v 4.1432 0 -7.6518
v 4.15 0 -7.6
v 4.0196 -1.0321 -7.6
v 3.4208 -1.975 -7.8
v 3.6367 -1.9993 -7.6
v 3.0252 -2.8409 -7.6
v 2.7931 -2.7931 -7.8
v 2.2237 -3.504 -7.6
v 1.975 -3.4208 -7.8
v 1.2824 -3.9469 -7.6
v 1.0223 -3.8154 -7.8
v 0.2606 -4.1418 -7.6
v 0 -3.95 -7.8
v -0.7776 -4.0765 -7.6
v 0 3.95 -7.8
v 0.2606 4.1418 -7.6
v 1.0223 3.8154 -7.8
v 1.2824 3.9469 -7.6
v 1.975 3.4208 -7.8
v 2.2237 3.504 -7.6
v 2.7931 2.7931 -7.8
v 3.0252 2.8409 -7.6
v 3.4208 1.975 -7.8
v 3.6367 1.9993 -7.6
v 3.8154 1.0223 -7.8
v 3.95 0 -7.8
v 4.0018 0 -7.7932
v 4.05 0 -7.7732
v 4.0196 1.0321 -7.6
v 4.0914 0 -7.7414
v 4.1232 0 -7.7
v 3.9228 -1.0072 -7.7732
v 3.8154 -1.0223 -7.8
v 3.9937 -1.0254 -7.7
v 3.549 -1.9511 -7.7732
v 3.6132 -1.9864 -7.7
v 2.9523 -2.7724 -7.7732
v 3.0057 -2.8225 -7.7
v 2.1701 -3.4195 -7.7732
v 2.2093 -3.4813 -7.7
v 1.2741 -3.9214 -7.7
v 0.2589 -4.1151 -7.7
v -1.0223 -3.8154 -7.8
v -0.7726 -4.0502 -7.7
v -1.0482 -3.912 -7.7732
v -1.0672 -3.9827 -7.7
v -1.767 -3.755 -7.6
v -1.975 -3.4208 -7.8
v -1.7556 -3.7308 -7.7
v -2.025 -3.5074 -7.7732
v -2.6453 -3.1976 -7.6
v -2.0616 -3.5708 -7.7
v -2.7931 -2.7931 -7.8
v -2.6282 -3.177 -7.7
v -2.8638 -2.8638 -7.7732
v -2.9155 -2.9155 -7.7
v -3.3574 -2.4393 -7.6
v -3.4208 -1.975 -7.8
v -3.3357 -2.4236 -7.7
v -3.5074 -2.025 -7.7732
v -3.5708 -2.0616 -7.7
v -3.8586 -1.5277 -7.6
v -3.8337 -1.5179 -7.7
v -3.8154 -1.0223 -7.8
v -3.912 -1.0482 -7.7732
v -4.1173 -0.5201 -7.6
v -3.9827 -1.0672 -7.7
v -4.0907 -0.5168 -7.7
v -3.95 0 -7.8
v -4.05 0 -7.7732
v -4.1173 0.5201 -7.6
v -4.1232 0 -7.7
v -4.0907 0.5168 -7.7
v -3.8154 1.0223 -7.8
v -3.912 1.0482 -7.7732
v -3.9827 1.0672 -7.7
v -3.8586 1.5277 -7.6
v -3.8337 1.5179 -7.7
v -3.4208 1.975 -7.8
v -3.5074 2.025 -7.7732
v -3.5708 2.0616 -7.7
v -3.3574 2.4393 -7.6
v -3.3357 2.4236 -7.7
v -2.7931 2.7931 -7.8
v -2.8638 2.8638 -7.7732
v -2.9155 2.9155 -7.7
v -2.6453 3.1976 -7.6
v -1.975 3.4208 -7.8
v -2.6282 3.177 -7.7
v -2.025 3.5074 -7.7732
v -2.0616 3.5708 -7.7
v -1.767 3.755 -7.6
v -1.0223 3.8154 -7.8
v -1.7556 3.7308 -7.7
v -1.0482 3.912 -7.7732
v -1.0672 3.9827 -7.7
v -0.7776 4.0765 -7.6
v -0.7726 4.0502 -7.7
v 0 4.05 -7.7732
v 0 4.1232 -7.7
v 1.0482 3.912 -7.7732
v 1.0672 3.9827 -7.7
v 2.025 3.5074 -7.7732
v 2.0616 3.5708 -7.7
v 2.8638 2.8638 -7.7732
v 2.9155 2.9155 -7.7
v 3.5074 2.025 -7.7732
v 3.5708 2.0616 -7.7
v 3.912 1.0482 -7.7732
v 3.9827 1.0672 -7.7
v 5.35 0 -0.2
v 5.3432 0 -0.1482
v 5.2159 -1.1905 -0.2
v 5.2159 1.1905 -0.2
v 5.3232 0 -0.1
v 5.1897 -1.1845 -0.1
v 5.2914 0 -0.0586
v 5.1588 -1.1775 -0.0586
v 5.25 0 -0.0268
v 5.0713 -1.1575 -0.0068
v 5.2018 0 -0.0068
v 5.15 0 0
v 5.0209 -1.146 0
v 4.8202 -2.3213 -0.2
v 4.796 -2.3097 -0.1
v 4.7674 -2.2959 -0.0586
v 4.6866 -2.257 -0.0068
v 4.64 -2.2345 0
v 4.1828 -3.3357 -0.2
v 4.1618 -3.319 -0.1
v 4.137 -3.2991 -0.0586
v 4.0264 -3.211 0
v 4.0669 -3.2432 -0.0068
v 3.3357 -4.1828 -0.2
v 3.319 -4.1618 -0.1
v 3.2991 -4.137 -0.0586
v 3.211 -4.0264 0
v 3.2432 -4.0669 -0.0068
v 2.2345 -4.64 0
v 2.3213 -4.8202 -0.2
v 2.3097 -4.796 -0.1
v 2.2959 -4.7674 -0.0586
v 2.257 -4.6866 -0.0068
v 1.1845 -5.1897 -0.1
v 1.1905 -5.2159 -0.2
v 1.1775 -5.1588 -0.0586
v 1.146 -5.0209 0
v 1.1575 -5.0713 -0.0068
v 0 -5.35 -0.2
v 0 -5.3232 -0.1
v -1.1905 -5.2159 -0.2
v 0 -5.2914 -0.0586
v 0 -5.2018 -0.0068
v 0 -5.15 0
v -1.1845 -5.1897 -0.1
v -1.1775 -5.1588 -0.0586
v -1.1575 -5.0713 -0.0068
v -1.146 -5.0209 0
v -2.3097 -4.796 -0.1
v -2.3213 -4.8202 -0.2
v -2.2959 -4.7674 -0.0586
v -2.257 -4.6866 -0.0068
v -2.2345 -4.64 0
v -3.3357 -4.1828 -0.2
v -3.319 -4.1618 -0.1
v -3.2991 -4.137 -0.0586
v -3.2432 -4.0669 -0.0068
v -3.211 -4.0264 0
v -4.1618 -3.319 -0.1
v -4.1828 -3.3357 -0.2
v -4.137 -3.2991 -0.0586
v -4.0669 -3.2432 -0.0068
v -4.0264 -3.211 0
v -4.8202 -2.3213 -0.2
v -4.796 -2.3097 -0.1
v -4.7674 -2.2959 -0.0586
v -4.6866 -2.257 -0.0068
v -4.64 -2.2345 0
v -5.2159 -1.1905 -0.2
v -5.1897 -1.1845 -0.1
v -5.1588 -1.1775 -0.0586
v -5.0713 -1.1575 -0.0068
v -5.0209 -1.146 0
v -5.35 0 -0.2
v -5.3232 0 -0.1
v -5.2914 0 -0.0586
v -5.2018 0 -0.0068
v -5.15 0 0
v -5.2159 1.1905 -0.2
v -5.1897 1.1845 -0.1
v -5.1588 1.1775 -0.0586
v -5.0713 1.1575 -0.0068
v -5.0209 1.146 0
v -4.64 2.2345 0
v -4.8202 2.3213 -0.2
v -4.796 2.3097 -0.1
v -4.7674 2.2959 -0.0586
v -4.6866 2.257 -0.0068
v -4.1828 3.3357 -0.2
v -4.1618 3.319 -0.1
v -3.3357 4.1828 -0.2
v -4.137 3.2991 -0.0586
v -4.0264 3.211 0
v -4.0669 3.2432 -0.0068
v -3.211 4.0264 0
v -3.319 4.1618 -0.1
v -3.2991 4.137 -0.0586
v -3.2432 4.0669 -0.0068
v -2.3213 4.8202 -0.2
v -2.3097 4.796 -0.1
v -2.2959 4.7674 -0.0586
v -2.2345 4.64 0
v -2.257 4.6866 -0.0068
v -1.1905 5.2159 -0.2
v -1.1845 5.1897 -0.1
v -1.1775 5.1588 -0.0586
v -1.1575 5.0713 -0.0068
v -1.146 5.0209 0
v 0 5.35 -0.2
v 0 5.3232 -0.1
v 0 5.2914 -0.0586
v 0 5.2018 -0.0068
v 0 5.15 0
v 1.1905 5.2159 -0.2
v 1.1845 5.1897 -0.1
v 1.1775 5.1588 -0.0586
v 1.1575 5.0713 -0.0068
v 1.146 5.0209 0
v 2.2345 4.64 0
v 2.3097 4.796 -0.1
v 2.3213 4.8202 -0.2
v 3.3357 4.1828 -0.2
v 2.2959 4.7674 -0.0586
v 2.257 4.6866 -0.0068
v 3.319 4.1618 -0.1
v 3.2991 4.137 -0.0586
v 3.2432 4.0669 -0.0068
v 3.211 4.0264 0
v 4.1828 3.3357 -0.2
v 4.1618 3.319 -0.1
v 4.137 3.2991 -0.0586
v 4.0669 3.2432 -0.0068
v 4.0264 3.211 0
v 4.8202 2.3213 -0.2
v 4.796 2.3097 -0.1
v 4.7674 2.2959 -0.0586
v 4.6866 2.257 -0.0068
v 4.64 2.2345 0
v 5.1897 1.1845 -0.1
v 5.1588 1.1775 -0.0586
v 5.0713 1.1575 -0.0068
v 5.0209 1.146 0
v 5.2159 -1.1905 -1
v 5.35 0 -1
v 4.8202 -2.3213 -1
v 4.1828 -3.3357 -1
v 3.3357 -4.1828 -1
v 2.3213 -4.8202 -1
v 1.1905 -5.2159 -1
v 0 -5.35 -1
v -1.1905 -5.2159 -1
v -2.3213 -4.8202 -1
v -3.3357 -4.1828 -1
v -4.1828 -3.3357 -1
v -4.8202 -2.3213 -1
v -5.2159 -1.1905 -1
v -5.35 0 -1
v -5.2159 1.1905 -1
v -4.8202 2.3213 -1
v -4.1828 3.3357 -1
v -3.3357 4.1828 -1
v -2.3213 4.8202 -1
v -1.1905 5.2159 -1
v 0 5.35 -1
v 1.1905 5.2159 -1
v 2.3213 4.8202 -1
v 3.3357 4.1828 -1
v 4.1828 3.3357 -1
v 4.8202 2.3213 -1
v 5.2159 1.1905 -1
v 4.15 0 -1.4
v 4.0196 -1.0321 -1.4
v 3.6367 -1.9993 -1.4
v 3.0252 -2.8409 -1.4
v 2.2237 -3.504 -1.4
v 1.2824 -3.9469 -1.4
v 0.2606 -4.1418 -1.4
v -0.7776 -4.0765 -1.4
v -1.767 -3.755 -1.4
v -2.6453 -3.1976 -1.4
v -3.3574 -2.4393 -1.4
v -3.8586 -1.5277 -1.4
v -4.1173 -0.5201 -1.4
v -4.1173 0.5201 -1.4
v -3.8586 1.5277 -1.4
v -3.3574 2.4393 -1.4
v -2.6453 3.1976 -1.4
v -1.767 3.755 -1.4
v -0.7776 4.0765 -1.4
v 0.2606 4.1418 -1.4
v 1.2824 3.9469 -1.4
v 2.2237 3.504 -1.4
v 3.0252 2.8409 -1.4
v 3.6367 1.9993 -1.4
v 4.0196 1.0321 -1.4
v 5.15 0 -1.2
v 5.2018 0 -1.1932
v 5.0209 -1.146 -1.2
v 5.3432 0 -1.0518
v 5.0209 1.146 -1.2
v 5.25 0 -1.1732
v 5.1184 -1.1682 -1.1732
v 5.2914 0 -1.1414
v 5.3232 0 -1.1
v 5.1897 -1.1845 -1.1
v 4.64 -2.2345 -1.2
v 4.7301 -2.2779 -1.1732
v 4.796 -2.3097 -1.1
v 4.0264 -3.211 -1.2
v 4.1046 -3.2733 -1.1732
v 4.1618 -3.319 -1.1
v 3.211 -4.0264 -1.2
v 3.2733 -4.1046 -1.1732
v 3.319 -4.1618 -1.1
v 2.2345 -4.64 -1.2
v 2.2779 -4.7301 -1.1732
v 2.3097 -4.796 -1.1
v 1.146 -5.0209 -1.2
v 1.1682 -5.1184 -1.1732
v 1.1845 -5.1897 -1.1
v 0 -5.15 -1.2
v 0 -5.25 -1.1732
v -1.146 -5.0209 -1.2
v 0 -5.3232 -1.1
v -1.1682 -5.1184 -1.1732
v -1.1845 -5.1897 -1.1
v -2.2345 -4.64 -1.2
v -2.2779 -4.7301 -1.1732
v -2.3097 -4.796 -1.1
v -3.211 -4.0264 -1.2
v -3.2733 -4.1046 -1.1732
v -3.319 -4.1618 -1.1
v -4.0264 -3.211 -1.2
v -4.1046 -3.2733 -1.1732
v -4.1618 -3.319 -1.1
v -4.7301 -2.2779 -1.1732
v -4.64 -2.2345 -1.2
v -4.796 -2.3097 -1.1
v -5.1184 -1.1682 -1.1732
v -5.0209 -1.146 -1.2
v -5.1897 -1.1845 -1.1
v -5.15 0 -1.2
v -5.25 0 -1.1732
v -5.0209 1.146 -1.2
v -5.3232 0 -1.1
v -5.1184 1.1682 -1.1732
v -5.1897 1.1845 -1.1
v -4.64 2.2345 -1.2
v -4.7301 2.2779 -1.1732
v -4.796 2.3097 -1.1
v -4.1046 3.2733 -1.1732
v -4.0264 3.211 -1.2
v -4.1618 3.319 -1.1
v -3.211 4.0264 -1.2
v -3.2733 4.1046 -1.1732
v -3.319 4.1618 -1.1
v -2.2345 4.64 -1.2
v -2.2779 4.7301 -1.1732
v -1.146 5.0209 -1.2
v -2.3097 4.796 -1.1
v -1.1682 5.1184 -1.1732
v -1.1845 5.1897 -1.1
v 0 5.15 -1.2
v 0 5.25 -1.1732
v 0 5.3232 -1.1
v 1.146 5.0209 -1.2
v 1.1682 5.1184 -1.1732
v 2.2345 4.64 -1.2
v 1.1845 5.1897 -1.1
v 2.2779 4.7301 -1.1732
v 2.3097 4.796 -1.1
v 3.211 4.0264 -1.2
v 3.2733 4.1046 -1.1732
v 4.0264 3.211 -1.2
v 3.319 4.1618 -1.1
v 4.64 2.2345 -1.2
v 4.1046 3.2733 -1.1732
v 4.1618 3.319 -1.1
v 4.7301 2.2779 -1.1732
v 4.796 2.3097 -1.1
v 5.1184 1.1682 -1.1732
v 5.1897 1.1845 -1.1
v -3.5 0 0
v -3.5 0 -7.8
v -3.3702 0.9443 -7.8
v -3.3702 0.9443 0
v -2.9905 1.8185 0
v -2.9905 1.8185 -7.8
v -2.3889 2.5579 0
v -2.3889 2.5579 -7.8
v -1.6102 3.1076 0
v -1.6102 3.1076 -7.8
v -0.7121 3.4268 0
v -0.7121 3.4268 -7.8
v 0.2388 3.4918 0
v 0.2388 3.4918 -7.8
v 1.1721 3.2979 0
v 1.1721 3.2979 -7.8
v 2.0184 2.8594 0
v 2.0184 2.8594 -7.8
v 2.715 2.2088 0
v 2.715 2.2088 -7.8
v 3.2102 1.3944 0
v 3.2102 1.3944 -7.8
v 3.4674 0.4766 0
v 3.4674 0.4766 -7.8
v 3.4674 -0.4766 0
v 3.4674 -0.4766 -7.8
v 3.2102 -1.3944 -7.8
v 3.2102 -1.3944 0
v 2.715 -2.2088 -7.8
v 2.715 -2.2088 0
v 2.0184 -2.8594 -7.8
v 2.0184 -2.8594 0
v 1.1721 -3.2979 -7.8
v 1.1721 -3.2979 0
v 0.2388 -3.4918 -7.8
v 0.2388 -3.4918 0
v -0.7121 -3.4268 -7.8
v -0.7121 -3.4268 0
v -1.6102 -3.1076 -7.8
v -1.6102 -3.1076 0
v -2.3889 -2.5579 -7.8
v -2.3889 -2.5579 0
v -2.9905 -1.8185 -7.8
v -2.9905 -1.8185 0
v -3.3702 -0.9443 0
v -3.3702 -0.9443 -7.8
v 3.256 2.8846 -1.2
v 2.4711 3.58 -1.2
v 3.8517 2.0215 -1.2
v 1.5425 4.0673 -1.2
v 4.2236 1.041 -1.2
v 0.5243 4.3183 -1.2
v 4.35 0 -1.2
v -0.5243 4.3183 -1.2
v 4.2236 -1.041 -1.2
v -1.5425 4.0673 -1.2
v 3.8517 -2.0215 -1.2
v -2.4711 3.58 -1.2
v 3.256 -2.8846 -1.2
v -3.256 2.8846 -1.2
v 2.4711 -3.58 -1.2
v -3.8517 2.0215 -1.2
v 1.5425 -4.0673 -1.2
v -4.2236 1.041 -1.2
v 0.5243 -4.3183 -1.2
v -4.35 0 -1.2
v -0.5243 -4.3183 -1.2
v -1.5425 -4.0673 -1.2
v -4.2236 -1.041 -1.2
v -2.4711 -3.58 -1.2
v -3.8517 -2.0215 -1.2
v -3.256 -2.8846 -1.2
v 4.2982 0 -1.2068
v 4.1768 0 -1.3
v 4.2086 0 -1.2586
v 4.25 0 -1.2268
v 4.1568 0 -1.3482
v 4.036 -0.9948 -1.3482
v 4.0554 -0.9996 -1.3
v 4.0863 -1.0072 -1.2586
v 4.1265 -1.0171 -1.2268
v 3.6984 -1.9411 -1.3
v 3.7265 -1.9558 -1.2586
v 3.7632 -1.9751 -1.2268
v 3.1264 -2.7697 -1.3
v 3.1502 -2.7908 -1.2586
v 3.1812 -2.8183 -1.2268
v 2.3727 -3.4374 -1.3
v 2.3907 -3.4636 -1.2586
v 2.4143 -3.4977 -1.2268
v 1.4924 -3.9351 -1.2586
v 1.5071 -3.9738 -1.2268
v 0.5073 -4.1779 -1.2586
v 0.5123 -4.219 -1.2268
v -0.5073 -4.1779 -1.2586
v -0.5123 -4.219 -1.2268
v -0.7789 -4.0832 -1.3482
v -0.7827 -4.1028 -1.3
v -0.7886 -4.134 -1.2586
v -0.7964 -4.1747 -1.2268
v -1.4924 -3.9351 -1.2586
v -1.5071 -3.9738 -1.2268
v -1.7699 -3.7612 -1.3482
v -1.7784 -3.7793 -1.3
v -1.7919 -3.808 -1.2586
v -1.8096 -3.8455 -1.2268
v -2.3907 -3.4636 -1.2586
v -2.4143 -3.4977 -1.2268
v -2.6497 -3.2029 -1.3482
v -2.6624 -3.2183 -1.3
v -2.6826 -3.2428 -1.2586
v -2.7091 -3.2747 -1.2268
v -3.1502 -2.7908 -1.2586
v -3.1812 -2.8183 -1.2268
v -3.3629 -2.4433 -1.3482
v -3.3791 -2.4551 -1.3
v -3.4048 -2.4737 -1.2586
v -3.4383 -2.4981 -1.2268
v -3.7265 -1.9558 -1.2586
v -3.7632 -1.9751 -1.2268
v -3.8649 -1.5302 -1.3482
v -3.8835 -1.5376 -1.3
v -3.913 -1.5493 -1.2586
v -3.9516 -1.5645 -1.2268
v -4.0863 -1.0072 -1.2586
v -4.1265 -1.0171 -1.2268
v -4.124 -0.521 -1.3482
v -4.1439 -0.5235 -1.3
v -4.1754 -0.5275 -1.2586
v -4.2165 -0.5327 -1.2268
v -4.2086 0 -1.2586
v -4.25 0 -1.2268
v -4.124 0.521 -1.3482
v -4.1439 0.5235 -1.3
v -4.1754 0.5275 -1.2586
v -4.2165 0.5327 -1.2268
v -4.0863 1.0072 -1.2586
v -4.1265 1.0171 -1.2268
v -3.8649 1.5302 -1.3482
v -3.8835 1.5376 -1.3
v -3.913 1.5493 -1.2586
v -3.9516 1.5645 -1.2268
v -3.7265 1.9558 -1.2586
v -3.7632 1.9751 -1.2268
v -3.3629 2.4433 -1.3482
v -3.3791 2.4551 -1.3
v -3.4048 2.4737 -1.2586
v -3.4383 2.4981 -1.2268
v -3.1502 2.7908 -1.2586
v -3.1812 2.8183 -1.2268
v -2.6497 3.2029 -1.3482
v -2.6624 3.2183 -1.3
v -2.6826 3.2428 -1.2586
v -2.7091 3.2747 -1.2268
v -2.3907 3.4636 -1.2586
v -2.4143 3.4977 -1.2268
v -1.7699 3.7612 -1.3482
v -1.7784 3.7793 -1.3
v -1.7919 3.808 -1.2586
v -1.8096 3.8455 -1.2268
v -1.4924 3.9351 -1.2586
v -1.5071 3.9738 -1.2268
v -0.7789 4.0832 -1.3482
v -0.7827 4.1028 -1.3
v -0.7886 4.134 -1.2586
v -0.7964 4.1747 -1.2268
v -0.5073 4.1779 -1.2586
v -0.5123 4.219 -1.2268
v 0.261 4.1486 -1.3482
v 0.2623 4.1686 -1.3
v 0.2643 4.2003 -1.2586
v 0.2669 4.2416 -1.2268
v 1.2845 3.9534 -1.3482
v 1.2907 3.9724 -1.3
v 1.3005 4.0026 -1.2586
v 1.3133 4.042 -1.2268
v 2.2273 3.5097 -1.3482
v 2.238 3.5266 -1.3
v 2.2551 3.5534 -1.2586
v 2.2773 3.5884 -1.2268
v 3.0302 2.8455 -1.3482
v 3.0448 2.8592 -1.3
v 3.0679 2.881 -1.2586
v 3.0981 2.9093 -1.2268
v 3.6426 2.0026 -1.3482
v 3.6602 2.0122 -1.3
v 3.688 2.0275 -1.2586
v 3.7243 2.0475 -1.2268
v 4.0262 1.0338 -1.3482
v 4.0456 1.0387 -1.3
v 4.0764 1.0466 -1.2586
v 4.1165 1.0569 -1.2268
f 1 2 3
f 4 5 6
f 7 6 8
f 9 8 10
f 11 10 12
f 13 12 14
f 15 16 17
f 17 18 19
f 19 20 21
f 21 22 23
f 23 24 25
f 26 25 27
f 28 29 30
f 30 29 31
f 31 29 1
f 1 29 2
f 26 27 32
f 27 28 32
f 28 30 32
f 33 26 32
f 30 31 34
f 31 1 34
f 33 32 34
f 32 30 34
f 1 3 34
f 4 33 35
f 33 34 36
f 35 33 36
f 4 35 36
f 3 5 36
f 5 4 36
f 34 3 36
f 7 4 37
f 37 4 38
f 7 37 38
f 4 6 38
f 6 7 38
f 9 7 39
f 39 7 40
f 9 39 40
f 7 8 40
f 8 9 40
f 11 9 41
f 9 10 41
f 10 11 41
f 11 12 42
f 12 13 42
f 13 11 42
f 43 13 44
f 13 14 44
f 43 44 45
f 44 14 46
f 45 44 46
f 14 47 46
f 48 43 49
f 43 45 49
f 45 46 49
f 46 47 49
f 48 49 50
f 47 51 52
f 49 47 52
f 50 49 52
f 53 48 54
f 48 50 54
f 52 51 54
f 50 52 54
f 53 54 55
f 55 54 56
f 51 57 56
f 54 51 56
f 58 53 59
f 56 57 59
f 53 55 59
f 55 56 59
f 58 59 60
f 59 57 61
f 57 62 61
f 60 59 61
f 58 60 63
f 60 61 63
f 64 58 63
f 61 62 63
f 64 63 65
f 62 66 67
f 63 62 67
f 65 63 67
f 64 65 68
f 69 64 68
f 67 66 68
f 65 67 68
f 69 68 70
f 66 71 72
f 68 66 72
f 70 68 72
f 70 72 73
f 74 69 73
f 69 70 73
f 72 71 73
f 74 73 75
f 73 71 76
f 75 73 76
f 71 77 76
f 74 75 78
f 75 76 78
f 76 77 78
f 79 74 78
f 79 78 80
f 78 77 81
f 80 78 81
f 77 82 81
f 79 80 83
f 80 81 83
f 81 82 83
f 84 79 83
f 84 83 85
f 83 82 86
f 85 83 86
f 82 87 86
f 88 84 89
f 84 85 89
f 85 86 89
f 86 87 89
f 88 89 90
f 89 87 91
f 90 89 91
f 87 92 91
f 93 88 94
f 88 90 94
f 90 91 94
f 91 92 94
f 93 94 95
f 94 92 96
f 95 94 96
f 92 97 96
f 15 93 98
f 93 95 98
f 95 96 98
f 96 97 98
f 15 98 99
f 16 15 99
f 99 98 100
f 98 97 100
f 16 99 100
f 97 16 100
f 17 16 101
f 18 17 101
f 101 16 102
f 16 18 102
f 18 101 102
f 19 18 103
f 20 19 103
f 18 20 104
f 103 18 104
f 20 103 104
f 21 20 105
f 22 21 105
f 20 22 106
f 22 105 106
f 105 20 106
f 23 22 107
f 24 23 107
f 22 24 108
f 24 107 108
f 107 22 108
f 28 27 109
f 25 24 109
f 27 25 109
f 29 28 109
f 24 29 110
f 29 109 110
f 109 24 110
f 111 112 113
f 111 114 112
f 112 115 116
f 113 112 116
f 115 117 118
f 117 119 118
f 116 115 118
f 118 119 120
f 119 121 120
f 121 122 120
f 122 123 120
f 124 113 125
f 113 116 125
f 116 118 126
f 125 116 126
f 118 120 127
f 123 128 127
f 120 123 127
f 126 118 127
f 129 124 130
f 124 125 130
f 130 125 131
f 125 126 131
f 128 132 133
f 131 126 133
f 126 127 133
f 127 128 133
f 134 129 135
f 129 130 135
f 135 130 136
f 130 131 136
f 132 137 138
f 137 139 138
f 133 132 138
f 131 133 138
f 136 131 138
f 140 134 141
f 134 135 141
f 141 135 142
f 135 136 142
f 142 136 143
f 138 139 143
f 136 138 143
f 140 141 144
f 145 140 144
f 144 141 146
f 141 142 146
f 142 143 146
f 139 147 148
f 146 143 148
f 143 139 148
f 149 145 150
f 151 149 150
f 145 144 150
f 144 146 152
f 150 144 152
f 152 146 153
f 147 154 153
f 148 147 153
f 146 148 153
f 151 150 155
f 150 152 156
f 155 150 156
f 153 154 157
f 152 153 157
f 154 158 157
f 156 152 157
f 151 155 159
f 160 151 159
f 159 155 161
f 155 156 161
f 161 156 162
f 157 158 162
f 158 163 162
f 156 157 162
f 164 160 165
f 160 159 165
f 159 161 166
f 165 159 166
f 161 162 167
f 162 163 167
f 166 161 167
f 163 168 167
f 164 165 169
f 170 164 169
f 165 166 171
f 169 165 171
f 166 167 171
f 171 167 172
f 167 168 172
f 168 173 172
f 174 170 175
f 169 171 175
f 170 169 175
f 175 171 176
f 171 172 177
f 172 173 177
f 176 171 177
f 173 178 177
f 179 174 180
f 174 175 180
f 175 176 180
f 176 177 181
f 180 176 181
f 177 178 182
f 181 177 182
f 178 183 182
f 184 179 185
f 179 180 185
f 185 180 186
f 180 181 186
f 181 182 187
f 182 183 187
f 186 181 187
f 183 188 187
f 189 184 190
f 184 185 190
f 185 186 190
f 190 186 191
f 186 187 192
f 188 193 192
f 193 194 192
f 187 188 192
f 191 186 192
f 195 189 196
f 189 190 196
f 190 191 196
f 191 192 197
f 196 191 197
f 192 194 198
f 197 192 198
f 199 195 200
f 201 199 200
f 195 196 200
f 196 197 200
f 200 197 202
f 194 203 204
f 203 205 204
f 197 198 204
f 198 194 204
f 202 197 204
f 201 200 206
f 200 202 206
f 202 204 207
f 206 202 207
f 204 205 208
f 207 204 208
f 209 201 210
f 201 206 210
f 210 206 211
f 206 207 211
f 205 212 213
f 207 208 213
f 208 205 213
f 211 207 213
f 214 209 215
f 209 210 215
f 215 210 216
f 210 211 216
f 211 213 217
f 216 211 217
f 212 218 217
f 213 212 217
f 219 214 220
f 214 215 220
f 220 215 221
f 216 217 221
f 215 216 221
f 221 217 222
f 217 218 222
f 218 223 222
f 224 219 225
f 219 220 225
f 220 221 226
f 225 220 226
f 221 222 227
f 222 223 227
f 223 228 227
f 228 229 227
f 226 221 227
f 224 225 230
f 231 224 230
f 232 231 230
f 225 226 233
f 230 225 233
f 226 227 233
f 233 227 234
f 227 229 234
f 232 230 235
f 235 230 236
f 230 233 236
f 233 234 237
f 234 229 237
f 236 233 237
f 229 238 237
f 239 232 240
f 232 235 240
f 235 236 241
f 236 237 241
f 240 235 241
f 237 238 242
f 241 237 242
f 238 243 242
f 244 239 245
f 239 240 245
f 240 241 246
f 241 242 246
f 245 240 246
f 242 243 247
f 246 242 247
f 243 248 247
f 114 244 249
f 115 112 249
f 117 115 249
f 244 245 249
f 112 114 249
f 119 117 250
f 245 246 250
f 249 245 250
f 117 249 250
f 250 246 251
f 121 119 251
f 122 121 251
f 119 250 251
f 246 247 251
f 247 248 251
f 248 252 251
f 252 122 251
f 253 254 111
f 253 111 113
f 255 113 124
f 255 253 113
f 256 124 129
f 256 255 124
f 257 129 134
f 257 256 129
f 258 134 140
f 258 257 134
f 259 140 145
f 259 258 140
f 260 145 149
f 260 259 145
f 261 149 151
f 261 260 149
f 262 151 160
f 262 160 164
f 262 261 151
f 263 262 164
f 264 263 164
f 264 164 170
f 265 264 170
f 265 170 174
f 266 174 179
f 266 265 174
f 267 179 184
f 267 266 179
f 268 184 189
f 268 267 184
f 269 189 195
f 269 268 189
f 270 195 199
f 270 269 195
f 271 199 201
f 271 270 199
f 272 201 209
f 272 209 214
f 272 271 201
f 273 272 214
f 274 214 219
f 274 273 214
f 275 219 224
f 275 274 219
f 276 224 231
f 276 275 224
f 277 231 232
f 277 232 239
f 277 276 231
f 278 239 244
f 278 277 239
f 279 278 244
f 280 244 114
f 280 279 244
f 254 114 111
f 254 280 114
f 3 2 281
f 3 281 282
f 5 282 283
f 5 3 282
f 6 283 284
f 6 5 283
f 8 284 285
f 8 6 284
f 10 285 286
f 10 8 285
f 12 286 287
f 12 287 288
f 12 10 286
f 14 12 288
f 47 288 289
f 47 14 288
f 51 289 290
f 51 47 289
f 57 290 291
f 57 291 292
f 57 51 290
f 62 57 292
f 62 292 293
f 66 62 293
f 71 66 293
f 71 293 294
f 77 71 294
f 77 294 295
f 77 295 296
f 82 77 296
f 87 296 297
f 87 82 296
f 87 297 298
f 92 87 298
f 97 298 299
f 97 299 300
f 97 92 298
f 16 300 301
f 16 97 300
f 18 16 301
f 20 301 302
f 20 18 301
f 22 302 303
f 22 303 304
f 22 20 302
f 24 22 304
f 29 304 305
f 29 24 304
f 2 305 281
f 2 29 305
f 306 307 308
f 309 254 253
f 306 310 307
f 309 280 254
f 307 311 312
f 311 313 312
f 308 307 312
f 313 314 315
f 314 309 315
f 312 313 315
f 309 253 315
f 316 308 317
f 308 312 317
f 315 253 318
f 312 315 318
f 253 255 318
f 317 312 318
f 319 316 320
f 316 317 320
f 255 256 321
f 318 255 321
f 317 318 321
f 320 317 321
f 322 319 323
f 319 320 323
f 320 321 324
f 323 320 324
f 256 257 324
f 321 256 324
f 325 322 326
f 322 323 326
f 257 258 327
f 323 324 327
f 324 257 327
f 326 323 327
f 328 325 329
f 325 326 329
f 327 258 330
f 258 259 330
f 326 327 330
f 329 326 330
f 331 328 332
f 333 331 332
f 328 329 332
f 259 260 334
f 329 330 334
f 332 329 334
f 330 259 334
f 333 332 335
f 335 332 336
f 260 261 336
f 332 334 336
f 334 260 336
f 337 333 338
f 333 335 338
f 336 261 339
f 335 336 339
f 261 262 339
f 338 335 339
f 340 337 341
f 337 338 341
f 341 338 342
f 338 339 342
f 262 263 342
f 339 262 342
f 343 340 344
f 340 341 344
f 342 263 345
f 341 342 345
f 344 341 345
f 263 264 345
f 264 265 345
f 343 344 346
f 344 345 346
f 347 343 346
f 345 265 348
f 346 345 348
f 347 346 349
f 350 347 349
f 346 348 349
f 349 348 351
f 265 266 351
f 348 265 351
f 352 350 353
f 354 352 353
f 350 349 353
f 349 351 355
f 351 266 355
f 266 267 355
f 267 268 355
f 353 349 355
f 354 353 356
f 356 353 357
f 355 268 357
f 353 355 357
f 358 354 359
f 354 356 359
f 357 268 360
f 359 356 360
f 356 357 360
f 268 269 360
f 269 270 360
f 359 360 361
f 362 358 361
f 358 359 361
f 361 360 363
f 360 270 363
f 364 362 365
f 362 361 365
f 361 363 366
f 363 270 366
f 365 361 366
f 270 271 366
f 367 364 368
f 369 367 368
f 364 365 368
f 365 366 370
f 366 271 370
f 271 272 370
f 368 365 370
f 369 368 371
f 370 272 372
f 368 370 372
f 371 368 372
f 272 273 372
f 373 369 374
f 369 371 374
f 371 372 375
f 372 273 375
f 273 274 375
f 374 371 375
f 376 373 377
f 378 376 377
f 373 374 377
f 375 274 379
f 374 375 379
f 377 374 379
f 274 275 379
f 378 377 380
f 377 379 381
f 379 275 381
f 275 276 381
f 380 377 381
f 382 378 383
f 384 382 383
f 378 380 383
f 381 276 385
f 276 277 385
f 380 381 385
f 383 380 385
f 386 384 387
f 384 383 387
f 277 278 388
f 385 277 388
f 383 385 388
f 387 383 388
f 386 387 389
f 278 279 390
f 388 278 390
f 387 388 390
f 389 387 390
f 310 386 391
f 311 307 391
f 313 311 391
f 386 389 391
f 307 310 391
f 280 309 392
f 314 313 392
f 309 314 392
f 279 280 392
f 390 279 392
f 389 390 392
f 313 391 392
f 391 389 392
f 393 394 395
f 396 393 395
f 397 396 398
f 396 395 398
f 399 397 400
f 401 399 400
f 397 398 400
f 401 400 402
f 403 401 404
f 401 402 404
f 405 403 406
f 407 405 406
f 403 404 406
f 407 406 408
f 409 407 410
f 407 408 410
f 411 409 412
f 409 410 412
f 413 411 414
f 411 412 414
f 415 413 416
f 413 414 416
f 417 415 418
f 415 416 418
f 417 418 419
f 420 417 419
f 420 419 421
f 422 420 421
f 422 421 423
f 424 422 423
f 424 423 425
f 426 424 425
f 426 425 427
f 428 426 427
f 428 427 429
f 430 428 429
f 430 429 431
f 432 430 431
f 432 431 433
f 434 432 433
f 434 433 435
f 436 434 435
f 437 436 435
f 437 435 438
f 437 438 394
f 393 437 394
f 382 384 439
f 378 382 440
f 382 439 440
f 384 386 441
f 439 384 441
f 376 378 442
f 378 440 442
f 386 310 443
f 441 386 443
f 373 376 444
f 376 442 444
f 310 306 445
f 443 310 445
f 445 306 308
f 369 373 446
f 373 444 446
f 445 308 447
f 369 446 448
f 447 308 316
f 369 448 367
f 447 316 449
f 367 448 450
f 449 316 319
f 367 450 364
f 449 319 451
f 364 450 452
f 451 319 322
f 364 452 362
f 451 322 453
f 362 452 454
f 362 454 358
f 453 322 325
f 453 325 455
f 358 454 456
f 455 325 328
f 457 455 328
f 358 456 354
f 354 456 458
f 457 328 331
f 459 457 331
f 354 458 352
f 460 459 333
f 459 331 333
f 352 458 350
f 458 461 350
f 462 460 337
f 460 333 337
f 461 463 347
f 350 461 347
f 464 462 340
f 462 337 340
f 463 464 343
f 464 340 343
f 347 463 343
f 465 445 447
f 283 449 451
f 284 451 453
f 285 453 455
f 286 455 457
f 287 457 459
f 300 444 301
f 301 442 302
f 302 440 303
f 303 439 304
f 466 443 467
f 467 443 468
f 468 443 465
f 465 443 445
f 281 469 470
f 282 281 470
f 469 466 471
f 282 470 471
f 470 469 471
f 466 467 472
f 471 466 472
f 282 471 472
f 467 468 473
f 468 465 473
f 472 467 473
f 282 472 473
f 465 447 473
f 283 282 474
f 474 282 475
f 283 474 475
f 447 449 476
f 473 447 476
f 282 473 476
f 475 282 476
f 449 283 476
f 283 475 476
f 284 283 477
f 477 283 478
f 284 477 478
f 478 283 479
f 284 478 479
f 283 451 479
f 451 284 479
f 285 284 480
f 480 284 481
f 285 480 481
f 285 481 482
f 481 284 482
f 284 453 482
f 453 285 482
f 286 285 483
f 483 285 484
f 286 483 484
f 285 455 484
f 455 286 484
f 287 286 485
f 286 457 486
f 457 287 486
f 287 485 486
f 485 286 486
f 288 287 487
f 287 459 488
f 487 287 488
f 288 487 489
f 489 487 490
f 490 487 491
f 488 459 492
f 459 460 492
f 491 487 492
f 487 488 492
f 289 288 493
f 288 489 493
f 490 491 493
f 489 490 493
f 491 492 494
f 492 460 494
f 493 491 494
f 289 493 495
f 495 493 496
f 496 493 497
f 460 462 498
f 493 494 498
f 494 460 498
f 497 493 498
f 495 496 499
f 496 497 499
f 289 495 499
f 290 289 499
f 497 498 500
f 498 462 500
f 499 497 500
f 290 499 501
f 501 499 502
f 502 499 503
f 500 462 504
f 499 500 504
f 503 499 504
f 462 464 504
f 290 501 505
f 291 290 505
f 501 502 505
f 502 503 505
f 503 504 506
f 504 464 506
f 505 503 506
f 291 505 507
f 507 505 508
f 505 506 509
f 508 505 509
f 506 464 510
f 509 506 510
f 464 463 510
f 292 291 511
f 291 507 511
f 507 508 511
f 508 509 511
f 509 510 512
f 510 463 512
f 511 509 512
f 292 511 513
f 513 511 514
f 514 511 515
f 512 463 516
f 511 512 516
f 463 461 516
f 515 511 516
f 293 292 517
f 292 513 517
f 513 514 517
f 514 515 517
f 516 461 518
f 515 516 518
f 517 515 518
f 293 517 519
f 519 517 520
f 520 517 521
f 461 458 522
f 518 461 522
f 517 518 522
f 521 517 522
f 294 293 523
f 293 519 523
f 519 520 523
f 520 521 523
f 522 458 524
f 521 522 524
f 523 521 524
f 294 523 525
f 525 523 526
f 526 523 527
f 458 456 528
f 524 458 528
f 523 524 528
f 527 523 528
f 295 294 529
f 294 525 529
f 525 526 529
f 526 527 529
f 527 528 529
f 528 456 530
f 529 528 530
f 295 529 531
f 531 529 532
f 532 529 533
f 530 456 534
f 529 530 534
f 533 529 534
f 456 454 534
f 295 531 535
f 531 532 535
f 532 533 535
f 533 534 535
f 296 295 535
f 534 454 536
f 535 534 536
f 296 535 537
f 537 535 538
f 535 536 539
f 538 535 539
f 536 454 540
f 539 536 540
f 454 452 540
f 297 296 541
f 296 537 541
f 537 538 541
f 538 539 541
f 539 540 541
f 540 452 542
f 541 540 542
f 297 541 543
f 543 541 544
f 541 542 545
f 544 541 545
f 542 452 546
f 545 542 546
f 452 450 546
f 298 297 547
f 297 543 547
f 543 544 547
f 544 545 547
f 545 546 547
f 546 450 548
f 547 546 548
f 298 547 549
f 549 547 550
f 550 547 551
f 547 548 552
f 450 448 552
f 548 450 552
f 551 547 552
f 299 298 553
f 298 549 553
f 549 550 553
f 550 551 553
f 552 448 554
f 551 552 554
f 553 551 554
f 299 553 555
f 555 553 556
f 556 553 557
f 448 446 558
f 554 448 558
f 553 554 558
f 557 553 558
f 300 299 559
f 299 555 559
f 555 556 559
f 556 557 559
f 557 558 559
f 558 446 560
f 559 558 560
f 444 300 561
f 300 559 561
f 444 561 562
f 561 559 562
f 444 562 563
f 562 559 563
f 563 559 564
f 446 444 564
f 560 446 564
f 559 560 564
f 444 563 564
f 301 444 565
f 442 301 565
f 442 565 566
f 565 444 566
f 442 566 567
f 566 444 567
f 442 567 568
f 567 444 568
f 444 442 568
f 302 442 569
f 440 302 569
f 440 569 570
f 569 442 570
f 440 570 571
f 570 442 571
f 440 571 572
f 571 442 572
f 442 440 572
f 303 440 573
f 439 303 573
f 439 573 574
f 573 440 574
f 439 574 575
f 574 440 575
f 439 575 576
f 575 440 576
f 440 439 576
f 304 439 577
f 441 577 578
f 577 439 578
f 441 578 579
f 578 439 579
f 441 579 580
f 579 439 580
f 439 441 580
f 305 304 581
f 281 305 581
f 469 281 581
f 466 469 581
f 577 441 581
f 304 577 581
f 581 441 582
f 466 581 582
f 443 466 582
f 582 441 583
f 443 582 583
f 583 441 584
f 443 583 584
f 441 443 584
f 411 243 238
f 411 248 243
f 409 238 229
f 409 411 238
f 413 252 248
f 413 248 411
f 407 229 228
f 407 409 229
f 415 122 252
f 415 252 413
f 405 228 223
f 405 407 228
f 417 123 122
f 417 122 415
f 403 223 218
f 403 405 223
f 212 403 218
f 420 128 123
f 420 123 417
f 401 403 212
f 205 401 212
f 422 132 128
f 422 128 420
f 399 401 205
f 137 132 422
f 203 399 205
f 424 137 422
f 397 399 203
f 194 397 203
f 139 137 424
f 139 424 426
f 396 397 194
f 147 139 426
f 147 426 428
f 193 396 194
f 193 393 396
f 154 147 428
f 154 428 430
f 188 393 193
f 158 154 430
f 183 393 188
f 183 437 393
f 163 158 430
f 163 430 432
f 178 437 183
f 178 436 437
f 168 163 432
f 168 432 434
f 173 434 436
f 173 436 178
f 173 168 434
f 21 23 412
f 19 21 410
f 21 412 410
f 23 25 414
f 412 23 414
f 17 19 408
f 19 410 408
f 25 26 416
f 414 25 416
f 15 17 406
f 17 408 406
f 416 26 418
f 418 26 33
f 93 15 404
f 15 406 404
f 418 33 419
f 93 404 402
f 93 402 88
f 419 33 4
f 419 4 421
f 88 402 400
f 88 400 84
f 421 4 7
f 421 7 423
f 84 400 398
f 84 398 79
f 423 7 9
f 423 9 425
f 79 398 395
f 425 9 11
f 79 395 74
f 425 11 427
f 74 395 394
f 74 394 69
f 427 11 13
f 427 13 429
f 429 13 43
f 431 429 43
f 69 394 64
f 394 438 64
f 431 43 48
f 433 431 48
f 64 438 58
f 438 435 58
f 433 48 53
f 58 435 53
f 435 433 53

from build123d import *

# Parameters (mm, degrees)
CROQUIS1_W            = 5.35
CROQUIS1_H            = 7.8
CROQUIS4_R            = 3.5
CORTAR_EXTRUIR1_DEPTH = 8
CROQUIS3_W            = 1.2
CROQUIS3_H            = 6.6
REDONDEO1_R           = 0.2
REDONDEO2_R           = 0.2
REDONDEO3_R           = 0.2


with BuildPart() as part:
    # Croquis1 → Revolución1 (revolve)
    with BuildSketch(Plane(origin=(0, 0, 0), x_dir=(1, 0, 0), z_dir=(0, 1, 0))):
        with Locations((2.675, 3.9)):
            Rectangle(CROQUIS1_W, CROQUIS1_H)
    revolve(axis=Axis((0, 0, 0), (0, 0, -1)))

    # Croquis4 → Cortar-Extruir1 (cut)
    with BuildSketch(Plane(origin=(0, 0, -7.8), x_dir=(-1, 0, 0), z_dir=(0, 0, -1))):
        Circle(CROQUIS4_R)
    extrude(amount=-CORTAR_EXTRUIR1_DEPTH, mode=Mode.SUBTRACT)

    # Croquis3 → Cortar-Revolución1 (revolve, cut)
    with BuildSketch(Plane(origin=(0, 0, 0), x_dir=(1, 0, 0), z_dir=(0, 1, 0))):
        with Locations((4.75, 4.5)):
            Rectangle(CROQUIS3_W, CROQUIS3_H)
    revolve(axis=Axis((0, 0, -1.2), (0, 0, -1)), mode=Mode.SUBTRACT)

    # Redondeo1
    redondeo1_edges = [part.edges().sort_by_distance(p)[0] for p in [
        (-4.15, 0, -7.8),
    ]]
    fillet(redondeo1_edges, radius=REDONDEO1_R)

    # Redondeo2
    redondeo2_edges = [part.edges().sort_by_distance(p)[0] for p in [
        (-4.15, 0, -1.2),
    ]]
    fillet(redondeo2_edges, radius=REDONDEO2_R)

    # Redondeo3
    redondeo3_edges = [part.edges().sort_by_distance(p)[0] for p in [
        (-5.35, 0, -1.2),
        (-5.35, 0, 0),
    ]]
    fillet(redondeo3_edges, radius=REDONDEO3_R)


solid = part.part
